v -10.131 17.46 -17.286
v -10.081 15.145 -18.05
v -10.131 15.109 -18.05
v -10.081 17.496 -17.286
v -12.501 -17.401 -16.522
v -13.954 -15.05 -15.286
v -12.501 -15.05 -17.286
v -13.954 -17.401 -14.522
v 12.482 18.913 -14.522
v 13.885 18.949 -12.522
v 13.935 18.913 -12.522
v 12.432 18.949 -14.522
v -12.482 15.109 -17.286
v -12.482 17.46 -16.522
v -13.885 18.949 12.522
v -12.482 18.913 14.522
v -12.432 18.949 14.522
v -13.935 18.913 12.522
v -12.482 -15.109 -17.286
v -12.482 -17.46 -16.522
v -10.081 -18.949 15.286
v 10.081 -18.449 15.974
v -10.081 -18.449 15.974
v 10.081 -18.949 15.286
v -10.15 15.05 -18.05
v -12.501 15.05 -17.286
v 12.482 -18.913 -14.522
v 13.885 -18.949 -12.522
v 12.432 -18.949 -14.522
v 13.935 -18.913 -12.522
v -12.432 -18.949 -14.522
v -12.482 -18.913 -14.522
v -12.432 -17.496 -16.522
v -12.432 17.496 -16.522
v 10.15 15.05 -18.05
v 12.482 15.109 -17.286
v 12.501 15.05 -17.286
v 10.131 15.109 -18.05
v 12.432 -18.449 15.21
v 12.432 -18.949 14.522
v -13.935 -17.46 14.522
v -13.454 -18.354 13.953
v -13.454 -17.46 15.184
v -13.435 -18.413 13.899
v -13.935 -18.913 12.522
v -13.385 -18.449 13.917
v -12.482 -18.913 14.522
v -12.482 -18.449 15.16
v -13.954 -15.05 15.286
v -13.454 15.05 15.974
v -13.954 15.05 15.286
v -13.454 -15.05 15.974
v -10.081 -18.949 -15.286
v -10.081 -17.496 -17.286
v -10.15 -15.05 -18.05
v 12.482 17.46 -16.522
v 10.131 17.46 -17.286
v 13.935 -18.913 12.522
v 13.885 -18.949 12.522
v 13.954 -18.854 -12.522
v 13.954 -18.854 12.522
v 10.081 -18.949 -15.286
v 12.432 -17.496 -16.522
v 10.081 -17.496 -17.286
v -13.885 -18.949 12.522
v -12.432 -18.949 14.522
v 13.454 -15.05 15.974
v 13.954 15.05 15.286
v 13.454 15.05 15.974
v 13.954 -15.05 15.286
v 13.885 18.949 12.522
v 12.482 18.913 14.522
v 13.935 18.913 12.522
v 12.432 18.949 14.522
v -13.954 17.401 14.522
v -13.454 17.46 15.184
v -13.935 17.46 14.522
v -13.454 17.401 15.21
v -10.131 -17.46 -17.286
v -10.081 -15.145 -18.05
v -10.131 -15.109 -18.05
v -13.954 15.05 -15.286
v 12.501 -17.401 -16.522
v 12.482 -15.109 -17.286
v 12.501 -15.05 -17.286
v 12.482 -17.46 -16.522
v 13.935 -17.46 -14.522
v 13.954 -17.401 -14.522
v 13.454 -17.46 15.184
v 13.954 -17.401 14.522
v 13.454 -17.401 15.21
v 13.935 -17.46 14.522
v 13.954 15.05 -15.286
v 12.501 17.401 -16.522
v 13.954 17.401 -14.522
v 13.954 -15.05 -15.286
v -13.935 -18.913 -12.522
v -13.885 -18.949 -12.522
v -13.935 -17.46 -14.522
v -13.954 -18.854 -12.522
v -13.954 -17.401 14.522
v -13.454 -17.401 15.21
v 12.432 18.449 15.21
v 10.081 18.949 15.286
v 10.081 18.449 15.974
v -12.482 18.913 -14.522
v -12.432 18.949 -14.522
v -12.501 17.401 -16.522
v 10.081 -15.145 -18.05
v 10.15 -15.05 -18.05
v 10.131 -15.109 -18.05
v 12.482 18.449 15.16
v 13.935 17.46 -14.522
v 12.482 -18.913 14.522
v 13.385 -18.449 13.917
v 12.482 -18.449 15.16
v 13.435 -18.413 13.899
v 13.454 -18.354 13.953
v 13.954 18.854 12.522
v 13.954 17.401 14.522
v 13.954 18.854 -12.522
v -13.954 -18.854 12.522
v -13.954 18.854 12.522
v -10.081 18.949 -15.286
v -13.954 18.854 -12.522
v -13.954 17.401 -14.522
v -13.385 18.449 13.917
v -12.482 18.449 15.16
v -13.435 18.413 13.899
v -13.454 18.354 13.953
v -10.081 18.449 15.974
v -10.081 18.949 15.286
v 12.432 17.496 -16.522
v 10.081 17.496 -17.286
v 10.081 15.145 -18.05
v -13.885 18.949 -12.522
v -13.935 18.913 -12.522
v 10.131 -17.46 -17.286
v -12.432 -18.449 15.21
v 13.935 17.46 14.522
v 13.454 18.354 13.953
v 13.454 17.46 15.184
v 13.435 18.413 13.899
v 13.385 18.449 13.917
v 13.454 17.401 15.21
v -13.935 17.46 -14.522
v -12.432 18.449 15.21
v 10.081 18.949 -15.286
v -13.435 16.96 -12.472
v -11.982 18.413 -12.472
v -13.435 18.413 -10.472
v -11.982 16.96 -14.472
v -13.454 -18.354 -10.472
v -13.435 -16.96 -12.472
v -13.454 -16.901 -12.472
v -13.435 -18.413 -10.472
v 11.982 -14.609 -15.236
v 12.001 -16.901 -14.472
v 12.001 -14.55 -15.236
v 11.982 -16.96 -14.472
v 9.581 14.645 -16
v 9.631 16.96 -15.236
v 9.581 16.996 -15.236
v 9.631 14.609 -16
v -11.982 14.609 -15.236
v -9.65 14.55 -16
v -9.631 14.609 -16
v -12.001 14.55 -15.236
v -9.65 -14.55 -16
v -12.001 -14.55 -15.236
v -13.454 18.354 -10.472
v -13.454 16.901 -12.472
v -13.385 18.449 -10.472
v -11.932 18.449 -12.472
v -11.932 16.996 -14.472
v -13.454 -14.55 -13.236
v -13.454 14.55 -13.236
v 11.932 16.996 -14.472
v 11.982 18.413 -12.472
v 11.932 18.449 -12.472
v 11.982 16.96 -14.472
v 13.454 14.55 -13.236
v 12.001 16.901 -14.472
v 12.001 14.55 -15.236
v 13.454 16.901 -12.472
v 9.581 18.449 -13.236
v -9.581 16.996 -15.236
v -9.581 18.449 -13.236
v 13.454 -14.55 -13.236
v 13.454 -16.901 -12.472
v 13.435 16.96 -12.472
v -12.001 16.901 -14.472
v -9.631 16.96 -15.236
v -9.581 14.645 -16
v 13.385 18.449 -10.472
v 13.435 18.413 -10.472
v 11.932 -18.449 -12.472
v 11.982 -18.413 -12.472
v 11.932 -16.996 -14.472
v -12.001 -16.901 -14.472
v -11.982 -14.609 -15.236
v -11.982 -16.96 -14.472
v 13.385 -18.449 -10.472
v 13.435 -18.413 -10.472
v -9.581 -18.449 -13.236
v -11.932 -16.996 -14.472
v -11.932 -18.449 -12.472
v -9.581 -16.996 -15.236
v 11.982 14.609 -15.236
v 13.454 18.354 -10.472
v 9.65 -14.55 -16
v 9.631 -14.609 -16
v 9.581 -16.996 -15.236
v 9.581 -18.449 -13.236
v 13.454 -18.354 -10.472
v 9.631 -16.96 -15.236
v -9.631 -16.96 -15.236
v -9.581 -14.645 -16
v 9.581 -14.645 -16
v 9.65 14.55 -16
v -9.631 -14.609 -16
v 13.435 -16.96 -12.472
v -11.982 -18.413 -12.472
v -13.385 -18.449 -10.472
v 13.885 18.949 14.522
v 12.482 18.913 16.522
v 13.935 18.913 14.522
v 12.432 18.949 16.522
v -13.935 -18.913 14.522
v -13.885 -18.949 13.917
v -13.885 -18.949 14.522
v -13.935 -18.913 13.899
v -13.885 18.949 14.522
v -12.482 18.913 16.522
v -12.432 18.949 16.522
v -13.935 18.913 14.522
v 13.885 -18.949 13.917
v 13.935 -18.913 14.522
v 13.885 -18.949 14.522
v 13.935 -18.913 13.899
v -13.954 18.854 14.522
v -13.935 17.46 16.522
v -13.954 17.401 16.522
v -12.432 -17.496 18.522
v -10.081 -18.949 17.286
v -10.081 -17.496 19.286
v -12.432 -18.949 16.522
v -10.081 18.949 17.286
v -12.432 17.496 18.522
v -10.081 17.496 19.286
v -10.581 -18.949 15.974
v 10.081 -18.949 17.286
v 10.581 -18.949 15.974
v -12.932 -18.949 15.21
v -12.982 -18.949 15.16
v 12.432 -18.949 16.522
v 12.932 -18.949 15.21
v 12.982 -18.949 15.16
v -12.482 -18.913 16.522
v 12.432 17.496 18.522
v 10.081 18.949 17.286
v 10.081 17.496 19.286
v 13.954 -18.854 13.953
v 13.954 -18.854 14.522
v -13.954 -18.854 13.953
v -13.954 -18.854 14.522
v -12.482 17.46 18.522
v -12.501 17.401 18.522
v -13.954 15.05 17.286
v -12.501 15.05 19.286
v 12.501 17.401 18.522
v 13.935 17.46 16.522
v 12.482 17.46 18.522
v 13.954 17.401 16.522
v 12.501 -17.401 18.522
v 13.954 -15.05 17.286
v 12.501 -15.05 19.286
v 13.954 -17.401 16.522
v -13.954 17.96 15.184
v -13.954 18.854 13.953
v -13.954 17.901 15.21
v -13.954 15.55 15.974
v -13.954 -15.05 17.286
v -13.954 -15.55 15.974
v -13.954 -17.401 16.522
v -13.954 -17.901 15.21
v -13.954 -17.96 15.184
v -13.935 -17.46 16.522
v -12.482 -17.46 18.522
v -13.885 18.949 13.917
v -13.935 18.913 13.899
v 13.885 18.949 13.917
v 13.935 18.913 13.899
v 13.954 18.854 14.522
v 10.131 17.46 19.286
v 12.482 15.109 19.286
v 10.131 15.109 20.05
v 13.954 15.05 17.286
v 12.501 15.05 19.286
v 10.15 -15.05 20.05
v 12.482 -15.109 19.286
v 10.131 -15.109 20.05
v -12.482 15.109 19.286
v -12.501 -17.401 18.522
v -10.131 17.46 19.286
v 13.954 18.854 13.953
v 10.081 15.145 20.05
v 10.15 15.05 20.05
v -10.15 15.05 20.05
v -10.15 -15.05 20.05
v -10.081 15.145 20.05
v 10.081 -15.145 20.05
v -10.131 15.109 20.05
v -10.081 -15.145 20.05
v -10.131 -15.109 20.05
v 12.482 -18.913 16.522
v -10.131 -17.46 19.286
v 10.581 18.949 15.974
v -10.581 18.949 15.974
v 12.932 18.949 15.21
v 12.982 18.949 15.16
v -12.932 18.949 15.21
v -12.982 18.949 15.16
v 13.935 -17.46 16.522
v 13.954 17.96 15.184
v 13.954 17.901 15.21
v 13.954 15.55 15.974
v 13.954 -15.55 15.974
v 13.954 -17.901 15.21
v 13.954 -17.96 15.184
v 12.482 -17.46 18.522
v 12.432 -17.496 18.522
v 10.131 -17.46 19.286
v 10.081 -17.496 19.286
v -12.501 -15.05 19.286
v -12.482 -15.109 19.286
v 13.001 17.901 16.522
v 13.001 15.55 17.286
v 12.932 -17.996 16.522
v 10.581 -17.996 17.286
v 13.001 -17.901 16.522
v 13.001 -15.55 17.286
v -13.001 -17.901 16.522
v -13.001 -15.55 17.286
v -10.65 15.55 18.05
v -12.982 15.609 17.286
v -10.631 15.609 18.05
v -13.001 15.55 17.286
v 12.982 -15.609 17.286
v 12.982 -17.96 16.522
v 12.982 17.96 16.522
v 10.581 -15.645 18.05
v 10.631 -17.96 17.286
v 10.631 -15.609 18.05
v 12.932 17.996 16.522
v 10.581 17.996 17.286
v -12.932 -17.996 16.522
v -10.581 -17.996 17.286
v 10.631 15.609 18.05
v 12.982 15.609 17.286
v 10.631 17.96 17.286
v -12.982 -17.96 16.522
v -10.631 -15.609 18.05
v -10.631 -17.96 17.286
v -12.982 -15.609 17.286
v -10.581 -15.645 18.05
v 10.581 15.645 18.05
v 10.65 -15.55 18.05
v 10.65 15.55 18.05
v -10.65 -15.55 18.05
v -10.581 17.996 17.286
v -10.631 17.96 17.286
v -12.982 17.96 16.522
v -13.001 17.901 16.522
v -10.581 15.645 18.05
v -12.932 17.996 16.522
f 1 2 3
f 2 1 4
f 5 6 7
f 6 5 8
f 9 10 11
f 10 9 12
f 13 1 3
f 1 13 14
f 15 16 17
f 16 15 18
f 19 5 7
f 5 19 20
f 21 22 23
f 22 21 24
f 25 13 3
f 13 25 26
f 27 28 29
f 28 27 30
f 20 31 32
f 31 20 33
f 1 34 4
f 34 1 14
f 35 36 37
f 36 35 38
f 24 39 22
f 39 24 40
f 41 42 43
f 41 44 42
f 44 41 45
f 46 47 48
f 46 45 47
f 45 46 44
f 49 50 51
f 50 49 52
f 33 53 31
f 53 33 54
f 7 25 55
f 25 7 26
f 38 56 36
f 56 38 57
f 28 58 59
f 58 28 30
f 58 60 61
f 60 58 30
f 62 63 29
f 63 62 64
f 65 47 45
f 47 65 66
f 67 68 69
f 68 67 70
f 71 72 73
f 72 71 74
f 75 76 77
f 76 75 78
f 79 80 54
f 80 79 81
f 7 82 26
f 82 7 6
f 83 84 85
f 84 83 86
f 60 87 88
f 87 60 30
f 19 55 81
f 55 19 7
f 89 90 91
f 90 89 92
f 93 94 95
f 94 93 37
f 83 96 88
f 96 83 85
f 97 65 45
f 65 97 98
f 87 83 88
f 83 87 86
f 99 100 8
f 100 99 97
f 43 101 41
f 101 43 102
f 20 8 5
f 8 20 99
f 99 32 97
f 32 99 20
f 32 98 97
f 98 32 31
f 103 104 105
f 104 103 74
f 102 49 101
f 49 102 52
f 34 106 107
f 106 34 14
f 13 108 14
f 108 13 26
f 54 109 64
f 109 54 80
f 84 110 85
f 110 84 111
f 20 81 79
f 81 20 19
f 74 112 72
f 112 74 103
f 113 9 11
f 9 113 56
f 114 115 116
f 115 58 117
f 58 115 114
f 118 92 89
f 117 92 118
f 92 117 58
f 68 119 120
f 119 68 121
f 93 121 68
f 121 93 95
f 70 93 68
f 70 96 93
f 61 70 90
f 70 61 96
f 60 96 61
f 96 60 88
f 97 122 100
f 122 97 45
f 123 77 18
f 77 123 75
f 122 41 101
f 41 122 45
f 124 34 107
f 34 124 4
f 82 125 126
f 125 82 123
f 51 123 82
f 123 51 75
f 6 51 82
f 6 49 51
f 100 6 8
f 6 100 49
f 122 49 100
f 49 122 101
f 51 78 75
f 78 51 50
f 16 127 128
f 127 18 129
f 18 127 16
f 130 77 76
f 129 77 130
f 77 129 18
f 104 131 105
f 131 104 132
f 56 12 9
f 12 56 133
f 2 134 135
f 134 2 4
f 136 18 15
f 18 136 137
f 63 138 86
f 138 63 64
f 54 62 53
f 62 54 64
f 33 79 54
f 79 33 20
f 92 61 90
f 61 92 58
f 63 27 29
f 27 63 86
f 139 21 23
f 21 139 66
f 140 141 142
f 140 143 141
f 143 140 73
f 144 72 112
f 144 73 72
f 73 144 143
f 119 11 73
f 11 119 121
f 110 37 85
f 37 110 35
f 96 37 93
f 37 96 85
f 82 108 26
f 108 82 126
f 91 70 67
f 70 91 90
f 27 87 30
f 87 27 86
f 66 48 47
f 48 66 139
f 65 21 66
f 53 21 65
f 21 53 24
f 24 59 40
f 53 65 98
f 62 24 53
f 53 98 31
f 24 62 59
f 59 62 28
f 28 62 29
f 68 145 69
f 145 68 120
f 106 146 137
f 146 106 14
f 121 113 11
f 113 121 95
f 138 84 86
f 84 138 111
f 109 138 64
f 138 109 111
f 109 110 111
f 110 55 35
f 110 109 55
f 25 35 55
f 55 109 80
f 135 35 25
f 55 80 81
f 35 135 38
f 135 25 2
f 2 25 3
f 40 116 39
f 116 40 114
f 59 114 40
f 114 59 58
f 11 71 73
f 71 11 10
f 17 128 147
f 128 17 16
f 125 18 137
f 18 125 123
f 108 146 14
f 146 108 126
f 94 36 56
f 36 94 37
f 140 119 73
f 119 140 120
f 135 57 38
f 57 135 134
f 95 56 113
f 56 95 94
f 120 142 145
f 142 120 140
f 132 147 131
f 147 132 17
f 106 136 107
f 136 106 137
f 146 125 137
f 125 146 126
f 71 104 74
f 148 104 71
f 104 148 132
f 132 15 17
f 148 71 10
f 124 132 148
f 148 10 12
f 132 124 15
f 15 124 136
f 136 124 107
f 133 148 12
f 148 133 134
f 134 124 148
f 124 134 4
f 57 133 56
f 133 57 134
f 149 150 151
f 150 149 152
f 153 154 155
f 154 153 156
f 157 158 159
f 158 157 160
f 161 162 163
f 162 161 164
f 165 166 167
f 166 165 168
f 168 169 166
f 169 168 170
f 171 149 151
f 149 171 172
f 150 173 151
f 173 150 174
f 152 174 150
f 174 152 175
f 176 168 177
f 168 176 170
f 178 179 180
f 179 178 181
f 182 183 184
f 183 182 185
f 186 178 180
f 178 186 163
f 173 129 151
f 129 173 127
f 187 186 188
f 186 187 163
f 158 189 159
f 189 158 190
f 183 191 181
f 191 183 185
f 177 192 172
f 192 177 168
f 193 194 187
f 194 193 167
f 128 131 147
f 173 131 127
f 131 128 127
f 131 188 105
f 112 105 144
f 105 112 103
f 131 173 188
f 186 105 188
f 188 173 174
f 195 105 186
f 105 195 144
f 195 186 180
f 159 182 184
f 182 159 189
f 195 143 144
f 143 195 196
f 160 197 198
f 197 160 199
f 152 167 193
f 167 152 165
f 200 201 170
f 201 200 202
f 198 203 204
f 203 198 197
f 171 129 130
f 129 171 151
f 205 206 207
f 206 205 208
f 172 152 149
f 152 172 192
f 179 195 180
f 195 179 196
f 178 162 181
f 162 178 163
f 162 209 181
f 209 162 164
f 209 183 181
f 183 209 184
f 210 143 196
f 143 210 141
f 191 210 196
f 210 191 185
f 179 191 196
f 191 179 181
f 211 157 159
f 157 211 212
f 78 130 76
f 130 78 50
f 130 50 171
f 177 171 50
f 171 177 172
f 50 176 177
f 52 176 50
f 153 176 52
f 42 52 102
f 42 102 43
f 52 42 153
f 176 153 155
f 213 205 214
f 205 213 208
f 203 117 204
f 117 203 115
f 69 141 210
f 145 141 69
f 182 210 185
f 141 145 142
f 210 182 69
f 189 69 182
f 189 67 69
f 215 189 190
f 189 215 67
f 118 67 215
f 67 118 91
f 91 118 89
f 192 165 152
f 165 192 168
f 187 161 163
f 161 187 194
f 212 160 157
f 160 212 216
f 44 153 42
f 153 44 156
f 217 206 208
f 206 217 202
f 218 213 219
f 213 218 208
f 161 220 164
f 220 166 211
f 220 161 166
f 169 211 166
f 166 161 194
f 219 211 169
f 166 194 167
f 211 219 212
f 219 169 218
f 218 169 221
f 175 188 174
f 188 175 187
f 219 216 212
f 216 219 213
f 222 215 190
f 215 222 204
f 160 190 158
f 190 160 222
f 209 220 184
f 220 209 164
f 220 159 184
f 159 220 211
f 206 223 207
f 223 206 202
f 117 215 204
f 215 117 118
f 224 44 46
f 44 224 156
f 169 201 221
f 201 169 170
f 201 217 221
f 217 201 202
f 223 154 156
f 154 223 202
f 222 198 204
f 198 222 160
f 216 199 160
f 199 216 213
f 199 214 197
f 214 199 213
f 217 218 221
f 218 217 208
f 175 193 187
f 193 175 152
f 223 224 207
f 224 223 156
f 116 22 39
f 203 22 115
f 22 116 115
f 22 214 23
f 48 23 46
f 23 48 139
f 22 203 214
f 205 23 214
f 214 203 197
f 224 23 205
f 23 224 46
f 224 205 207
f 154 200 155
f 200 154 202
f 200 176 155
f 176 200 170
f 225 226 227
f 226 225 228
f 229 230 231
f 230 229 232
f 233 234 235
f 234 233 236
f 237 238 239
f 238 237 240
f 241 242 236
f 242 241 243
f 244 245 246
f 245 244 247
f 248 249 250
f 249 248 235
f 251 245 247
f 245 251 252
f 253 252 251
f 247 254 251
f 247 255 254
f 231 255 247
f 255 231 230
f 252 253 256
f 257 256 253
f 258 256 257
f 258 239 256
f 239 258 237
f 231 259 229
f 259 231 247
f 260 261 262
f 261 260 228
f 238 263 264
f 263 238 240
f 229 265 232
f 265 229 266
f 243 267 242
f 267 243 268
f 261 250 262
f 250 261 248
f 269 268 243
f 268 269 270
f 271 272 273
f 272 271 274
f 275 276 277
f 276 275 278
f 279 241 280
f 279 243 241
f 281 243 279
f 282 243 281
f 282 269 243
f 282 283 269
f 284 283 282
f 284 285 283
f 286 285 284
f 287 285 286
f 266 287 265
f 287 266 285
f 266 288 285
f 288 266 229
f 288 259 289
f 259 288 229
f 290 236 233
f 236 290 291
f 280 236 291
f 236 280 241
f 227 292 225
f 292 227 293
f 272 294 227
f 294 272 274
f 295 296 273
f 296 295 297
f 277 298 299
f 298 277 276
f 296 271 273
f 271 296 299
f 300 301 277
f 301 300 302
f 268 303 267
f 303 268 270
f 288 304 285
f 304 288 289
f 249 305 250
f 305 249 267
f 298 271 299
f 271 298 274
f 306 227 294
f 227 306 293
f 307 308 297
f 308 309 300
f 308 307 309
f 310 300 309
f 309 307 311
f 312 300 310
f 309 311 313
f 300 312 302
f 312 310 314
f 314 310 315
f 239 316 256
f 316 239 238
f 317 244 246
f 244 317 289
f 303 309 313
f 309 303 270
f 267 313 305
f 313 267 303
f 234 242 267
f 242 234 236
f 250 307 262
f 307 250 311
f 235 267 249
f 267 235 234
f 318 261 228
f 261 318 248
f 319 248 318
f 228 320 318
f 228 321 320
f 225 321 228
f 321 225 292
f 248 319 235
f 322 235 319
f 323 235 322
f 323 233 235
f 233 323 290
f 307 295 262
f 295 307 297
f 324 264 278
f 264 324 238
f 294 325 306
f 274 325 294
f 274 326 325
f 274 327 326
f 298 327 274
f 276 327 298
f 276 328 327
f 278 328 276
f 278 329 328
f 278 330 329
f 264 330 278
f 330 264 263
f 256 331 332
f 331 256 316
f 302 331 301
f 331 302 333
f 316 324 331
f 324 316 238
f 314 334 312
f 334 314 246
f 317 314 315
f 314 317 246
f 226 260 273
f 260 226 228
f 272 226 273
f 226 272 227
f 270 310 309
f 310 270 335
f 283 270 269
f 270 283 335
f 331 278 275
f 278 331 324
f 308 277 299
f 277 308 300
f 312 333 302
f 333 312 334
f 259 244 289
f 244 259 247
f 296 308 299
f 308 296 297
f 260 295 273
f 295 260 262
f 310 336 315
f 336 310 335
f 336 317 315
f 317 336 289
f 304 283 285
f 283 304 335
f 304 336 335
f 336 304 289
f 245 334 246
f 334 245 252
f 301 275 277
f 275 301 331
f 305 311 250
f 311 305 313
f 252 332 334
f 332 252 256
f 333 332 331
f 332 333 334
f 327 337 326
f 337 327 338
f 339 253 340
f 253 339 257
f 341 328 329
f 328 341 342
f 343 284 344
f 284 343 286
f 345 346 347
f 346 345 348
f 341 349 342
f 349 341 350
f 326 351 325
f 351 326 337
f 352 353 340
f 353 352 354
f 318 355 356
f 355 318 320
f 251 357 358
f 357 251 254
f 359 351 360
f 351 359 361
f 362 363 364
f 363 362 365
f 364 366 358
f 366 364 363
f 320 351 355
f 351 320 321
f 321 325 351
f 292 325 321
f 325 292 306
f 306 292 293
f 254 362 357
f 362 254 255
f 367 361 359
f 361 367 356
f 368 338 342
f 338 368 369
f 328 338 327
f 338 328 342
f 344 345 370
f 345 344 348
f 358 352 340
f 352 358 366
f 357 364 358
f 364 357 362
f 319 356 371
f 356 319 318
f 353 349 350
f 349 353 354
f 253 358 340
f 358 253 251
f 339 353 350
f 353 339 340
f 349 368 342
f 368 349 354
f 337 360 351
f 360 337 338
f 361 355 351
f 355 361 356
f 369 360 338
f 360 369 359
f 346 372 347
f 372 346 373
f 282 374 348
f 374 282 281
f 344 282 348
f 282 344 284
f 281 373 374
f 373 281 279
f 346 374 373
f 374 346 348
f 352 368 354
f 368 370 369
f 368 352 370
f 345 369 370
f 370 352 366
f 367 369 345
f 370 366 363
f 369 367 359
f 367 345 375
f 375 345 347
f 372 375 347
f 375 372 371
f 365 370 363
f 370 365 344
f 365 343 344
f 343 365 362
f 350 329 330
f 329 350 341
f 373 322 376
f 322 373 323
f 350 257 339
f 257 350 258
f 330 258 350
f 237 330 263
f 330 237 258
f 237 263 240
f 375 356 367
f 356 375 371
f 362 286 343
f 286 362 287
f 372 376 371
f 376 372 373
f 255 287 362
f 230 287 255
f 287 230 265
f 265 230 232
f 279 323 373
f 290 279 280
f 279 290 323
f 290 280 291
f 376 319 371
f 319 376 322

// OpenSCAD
faccette=10;

difference()
{

minkowski()
{	
	
	cube([20,30,20],center=true);
	cylinder(h=0.1, r=0.1,center=true, $fn=faccette);
	rotate([90,90,0])cylinder(h=0.1, r=4,center=true, $fn=faccette);
	rotate([0,90,0])cylinder(h=0.1, r=4,center=true, $fn=faccette);
	
}
translate([0,0,2])
minkowski()
{	
	
	cube([19,29,19.9], center=true);
	cylinder(h=0.1, r=0.1,center=true, $fn=faccette);
	rotate([90,90,0])cylinder(h=0.1, r=4,center=true, $fn=faccette);
	rotate([0,90,0])cylinder(h=0.1, r=4,center=true, $fn=faccette);
	
}
}

difference()
{

minkowski()
{	
	translate([0,0,2])
	cube([20,30,20], center=true);
	cylinder(h=0.1, r=0.1,center=true, $fn=faccette);
	rotate([90,90,0])cylinder(h=0.1, r=4,center=true, $fn=faccette);
	rotate([0,90,0])cylinder(h=0.1, r=4,center=true, $fn=faccette);
	
}

minkowski()
{	
	
	cube([21,31,20],center=true);
	cylinder(h=0.1, r=0.1,center=true, $fn=faccette);
	rotate([90,90,0])cylinder(h=0.1, r=4,center=true, $fn=faccette);
	rotate([0,90,0])cylinder(h=0.1, r=4,center=true, $fn=faccette);
	
}
}
